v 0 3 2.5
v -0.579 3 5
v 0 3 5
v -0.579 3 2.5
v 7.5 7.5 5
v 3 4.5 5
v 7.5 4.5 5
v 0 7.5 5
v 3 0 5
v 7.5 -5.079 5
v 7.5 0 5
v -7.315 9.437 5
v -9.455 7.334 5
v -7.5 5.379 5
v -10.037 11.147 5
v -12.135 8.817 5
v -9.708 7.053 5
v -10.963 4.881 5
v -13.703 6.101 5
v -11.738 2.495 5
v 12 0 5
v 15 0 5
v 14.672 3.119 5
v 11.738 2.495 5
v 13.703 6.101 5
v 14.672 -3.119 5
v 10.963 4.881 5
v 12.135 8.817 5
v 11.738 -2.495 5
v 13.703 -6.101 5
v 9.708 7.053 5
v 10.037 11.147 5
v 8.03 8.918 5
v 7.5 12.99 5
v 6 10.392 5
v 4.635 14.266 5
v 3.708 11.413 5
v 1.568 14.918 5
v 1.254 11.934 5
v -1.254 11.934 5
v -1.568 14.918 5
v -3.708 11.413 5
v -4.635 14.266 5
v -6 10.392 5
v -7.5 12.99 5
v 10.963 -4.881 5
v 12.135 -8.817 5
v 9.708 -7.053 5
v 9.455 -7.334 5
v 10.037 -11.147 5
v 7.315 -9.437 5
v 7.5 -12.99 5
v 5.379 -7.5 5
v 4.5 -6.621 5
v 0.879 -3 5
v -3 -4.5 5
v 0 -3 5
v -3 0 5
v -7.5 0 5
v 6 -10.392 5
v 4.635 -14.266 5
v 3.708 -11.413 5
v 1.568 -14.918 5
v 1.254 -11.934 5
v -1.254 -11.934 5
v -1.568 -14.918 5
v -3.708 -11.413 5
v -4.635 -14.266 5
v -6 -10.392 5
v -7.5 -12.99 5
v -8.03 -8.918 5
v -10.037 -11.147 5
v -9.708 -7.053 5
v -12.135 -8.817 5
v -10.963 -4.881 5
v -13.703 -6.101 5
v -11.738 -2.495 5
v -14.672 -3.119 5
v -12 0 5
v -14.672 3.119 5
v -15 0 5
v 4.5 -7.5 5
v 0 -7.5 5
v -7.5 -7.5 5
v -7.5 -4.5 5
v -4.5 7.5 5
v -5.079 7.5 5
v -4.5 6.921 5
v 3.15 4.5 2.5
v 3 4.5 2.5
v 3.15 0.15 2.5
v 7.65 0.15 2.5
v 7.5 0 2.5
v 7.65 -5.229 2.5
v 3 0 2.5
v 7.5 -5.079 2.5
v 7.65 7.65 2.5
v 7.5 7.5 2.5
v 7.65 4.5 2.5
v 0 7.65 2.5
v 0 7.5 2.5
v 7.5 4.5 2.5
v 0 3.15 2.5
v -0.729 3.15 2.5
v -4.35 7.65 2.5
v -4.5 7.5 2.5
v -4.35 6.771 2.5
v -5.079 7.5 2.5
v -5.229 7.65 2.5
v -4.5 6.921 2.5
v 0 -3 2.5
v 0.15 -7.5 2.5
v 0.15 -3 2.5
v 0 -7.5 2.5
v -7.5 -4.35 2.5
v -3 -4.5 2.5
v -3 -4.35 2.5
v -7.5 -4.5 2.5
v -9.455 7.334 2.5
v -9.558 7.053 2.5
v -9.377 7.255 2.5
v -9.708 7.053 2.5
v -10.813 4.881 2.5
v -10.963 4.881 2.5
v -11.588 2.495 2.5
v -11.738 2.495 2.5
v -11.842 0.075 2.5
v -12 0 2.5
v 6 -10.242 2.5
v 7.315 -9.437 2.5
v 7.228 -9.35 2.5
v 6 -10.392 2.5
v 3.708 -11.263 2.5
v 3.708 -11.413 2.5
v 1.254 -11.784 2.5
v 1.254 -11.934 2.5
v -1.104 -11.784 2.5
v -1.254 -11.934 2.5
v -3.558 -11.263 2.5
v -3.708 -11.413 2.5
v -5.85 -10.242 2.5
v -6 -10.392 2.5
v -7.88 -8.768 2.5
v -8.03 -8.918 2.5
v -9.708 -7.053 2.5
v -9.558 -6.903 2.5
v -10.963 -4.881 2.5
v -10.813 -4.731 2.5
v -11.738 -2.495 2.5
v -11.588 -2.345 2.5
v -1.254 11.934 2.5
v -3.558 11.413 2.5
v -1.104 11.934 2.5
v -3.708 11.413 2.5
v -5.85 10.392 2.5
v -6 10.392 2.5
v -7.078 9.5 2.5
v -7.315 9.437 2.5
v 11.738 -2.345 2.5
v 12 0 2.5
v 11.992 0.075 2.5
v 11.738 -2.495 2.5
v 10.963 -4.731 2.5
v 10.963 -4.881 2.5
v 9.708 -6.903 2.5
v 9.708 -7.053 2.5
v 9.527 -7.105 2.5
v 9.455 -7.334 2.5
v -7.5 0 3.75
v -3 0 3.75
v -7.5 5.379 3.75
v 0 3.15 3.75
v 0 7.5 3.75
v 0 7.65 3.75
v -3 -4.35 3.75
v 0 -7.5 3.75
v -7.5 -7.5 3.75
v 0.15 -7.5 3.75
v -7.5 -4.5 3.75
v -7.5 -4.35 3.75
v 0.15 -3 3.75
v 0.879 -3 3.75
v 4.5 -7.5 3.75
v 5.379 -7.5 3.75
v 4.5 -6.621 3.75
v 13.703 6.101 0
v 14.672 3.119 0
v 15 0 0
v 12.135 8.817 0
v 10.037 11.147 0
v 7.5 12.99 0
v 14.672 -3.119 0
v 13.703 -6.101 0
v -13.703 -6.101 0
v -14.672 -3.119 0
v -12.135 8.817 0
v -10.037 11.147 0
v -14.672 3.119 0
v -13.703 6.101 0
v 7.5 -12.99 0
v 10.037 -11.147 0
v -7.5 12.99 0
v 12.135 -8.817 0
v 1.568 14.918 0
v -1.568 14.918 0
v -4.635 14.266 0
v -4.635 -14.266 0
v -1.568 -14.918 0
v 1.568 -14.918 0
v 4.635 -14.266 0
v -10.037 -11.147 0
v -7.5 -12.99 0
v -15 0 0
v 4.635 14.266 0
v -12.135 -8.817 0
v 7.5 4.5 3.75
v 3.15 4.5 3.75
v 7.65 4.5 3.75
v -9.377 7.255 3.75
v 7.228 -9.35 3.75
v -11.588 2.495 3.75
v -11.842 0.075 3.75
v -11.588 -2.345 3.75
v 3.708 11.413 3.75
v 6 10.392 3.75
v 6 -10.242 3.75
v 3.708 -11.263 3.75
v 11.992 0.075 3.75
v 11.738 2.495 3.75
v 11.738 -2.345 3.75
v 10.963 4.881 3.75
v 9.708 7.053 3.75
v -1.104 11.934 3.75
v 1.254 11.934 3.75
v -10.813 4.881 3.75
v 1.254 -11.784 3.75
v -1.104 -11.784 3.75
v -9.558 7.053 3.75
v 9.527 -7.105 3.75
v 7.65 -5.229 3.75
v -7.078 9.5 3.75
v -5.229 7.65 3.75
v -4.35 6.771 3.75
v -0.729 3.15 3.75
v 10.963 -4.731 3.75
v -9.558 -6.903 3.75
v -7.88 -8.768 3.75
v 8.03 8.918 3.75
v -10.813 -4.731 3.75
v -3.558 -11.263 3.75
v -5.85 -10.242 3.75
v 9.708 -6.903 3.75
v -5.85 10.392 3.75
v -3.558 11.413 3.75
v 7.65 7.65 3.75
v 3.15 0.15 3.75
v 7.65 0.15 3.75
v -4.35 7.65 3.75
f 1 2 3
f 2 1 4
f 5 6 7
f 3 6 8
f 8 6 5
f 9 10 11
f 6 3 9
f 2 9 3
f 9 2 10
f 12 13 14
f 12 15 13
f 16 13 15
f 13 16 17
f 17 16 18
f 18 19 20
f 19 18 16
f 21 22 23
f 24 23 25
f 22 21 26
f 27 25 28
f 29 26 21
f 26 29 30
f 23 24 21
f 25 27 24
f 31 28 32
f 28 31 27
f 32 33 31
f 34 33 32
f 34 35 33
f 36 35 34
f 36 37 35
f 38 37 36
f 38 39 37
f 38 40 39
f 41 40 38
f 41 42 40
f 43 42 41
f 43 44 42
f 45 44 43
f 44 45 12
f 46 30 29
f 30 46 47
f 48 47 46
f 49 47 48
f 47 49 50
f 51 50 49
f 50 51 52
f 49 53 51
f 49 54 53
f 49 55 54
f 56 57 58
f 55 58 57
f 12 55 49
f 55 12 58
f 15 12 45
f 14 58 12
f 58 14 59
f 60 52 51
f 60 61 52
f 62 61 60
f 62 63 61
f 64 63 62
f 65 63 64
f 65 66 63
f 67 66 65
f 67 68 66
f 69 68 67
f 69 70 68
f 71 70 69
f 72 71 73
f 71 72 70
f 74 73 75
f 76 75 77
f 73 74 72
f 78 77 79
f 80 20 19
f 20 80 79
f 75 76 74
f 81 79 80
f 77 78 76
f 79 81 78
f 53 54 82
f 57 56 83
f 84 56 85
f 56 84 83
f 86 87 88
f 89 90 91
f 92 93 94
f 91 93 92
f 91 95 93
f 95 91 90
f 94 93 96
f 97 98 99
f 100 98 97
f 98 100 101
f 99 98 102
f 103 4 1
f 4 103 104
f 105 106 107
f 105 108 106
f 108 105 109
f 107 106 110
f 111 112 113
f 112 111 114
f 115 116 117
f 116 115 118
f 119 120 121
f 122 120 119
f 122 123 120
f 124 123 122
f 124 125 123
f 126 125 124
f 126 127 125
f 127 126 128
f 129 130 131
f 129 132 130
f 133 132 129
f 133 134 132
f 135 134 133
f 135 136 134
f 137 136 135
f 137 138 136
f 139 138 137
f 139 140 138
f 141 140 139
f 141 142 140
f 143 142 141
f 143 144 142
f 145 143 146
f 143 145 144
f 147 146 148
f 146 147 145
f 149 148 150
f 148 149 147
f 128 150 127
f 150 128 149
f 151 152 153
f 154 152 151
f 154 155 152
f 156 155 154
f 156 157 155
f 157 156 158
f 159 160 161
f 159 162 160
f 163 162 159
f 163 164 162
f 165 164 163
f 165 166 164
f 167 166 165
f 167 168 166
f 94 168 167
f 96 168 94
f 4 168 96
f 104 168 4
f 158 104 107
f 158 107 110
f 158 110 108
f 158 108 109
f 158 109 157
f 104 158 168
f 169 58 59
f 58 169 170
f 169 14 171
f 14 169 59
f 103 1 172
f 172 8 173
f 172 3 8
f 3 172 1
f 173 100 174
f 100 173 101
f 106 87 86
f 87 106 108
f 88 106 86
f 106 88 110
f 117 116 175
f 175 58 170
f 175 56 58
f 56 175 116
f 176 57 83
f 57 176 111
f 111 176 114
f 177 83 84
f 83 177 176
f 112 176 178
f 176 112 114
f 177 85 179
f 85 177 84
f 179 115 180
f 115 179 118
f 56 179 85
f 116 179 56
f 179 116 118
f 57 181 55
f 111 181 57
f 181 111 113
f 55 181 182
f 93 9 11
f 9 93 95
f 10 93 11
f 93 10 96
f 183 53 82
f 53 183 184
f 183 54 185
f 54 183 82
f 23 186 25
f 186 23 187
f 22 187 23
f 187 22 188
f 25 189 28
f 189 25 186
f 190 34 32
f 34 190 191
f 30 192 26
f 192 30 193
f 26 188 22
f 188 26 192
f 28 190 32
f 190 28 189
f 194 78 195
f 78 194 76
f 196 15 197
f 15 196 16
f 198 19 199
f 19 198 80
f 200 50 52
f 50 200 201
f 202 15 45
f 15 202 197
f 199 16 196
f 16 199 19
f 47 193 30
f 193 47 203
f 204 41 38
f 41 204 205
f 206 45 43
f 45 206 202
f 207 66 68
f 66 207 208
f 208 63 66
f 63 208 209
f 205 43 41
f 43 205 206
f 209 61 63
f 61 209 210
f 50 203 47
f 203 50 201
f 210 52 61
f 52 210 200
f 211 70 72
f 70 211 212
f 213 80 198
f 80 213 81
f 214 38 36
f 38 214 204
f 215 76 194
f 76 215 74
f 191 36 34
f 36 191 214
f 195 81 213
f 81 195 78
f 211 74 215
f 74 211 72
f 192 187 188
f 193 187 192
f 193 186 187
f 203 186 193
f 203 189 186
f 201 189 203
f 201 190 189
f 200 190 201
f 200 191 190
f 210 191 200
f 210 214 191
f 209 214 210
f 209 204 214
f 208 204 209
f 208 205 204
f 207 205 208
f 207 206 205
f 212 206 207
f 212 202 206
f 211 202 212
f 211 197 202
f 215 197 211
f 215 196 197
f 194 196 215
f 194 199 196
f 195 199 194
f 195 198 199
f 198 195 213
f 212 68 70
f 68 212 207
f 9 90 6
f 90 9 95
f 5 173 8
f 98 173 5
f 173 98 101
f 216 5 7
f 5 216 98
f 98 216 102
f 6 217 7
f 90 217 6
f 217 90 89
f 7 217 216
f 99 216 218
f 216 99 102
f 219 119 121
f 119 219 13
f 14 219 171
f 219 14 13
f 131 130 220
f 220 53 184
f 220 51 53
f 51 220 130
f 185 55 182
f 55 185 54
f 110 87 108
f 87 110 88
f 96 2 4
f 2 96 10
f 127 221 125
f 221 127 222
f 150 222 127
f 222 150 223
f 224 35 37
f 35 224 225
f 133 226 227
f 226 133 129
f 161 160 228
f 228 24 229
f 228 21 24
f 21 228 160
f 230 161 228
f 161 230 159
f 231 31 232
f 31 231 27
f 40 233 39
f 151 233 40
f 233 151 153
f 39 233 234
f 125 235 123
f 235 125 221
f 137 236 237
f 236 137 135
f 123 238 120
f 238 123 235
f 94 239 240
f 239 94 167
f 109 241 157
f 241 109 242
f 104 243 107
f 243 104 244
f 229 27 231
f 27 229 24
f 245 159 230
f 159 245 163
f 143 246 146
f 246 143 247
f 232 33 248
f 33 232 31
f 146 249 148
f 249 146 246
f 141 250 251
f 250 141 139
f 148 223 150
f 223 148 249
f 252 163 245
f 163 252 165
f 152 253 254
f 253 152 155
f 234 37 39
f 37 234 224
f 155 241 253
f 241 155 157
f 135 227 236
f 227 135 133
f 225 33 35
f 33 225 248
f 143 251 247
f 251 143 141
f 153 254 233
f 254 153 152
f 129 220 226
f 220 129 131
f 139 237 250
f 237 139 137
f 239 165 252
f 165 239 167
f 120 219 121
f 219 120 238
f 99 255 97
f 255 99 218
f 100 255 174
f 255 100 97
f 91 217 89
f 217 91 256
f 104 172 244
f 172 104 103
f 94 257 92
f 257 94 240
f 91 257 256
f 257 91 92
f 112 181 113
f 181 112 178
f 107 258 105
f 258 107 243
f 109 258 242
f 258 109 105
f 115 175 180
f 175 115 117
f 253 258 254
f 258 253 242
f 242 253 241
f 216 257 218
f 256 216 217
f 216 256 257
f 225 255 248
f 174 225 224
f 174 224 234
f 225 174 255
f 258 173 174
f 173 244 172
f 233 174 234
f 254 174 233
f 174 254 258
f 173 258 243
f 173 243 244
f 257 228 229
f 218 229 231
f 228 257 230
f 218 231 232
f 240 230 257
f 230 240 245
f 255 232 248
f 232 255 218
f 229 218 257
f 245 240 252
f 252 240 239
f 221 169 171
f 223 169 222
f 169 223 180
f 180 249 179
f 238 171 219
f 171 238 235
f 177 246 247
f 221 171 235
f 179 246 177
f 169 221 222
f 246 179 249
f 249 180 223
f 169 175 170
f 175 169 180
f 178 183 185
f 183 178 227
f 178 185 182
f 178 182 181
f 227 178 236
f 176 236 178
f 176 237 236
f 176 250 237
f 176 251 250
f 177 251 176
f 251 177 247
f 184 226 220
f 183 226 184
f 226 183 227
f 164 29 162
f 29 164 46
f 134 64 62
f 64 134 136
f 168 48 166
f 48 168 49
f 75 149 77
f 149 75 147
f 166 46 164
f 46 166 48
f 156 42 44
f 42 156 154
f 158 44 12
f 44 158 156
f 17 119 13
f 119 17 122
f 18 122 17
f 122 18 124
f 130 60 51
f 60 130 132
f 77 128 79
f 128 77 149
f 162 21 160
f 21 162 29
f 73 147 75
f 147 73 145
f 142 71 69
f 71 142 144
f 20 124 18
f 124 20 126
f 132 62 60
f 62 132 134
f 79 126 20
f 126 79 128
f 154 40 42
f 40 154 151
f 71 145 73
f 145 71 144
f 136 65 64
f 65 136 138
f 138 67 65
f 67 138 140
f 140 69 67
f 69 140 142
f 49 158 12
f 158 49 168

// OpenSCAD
union() {
	color(alpha = 1.0, c = [0, 0, 0]) {
		translate(v = [0, 0, 2.5]) {
			difference() {
				union() {
					translate(v = [0, 0, -2.5]) {
						cylinder(h = 2.5, r = 15.0);
					}
					cube(size = [3.0, 7.5, 2.5]);
					translate(v = [0, 4.5, 0]) {
						cube(size = [7.5, 3.0, 2.5]);
					}
					rotate(a = [0, 0, 90]) {
						union() {
							cube(size = [3.0, 7.5, 2.5]);
							translate(v = [0, 4.5, 0]) {
								cube(size = [7.5, 3.0, 2.5]);
							}
						}
					}
					rotate(a = [0, 0, 180]) {
						union() {
							cube(size = [3.0, 7.5, 2.5]);
							translate(v = [0, 4.5, 0]) {
								cube(size = [7.5, 3.0, 2.5]);
							}
						}
					}
					rotate(a = [0, 0, 270]) {
						union() {
							cube(size = [3.0, 7.5, 2.5]);
							translate(v = [0, 4.5, 0]) {
								cube(size = [7.5, 3.0, 2.5]);
							}
						}
					}
				}
				minkowski() {
					union() {
						difference() {
							cylinder(h = 2.5, r = 15.0);
							cylinder(h = 2.5, r = 12.0);
						}
						rotate(a = [0, 0, -45]) {
							translate(v = [-13.5, 0, 0]) {
								translate(v = [0, -1.5, 0]) {
									cube(size = [27.0, 3.0, 2.5]);
								}
							}
						}
					}
					cube(size = [0.15, 0.15, 0.15]);
				}
			}
		}
	}
	translate(v = [0, 0, 2.5]) {
		color(alpha = 1.0, c = [1, 1, 1]) {
			difference() {
				cylinder(h = 1.25, r = 12.0);
				minkowski() {
					union() {
						cube(size = [3.0, 7.5, 2.5]);
						translate(v = [0, 4.5, 0]) {
							cube(size = [7.5, 3.0, 2.5]);
						}
						rotate(a = [0, 0, 90]) {
							union() {
								cube(size = [3.0, 7.5, 2.5]);
								translate(v = [0, 4.5, 0]) {
									cube(size = [7.5, 3.0, 2.5]);
								}
							}
						}
						rotate(a = [0, 0, 180]) {
							union() {
								cube(size = [3.0, 7.5, 2.5]);
								translate(v = [0, 4.5, 0]) {
									cube(size = [7.5, 3.0, 2.5]);
								}
							}
						}
						rotate(a = [0, 0, 270]) {
							union() {
								cube(size = [3.0, 7.5, 2.5]);
								translate(v = [0, 4.5, 0]) {
									cube(size = [7.5, 3.0, 2.5]);
								}
							}
						}
					}
					cube(size = [0.15, 0.15, 0.15]);
				}
				minkowski() {
					union() {
						difference() {
							cylinder(h = 2.5, r = 15.0);
							cylinder(h = 2.5, r = 12.0);
						}
						rotate(a = [0, 0, -45]) {
							translate(v = [-13.5, 0, 0]) {
								translate(v = [0, -1.5, 0]) {
									cube(size = [27.0, 3.0, 2.5]);
								}
							}
						}
					}
					cube(size = [0.15, 0.15, 0.15]);
				}
			}
		}
	}
	translate(v = [0, 0, 2.5]) {
		color(alpha = 1.0, c = [1, 0, 0]) {
			union() {
				difference() {
					cylinder(h = 2.5, r = 15.0);
					cylinder(h = 2.5, r = 12.0);
				}
				rotate(a = [0, 0, -45]) {
					translate(v = [-13.5, 0, 0]) {
						translate(v = [0, -1.5, 0]) {
							cube(size = [27.0, 3.0, 2.5]);
						}
					}
				}
			}
		}
	}
}
